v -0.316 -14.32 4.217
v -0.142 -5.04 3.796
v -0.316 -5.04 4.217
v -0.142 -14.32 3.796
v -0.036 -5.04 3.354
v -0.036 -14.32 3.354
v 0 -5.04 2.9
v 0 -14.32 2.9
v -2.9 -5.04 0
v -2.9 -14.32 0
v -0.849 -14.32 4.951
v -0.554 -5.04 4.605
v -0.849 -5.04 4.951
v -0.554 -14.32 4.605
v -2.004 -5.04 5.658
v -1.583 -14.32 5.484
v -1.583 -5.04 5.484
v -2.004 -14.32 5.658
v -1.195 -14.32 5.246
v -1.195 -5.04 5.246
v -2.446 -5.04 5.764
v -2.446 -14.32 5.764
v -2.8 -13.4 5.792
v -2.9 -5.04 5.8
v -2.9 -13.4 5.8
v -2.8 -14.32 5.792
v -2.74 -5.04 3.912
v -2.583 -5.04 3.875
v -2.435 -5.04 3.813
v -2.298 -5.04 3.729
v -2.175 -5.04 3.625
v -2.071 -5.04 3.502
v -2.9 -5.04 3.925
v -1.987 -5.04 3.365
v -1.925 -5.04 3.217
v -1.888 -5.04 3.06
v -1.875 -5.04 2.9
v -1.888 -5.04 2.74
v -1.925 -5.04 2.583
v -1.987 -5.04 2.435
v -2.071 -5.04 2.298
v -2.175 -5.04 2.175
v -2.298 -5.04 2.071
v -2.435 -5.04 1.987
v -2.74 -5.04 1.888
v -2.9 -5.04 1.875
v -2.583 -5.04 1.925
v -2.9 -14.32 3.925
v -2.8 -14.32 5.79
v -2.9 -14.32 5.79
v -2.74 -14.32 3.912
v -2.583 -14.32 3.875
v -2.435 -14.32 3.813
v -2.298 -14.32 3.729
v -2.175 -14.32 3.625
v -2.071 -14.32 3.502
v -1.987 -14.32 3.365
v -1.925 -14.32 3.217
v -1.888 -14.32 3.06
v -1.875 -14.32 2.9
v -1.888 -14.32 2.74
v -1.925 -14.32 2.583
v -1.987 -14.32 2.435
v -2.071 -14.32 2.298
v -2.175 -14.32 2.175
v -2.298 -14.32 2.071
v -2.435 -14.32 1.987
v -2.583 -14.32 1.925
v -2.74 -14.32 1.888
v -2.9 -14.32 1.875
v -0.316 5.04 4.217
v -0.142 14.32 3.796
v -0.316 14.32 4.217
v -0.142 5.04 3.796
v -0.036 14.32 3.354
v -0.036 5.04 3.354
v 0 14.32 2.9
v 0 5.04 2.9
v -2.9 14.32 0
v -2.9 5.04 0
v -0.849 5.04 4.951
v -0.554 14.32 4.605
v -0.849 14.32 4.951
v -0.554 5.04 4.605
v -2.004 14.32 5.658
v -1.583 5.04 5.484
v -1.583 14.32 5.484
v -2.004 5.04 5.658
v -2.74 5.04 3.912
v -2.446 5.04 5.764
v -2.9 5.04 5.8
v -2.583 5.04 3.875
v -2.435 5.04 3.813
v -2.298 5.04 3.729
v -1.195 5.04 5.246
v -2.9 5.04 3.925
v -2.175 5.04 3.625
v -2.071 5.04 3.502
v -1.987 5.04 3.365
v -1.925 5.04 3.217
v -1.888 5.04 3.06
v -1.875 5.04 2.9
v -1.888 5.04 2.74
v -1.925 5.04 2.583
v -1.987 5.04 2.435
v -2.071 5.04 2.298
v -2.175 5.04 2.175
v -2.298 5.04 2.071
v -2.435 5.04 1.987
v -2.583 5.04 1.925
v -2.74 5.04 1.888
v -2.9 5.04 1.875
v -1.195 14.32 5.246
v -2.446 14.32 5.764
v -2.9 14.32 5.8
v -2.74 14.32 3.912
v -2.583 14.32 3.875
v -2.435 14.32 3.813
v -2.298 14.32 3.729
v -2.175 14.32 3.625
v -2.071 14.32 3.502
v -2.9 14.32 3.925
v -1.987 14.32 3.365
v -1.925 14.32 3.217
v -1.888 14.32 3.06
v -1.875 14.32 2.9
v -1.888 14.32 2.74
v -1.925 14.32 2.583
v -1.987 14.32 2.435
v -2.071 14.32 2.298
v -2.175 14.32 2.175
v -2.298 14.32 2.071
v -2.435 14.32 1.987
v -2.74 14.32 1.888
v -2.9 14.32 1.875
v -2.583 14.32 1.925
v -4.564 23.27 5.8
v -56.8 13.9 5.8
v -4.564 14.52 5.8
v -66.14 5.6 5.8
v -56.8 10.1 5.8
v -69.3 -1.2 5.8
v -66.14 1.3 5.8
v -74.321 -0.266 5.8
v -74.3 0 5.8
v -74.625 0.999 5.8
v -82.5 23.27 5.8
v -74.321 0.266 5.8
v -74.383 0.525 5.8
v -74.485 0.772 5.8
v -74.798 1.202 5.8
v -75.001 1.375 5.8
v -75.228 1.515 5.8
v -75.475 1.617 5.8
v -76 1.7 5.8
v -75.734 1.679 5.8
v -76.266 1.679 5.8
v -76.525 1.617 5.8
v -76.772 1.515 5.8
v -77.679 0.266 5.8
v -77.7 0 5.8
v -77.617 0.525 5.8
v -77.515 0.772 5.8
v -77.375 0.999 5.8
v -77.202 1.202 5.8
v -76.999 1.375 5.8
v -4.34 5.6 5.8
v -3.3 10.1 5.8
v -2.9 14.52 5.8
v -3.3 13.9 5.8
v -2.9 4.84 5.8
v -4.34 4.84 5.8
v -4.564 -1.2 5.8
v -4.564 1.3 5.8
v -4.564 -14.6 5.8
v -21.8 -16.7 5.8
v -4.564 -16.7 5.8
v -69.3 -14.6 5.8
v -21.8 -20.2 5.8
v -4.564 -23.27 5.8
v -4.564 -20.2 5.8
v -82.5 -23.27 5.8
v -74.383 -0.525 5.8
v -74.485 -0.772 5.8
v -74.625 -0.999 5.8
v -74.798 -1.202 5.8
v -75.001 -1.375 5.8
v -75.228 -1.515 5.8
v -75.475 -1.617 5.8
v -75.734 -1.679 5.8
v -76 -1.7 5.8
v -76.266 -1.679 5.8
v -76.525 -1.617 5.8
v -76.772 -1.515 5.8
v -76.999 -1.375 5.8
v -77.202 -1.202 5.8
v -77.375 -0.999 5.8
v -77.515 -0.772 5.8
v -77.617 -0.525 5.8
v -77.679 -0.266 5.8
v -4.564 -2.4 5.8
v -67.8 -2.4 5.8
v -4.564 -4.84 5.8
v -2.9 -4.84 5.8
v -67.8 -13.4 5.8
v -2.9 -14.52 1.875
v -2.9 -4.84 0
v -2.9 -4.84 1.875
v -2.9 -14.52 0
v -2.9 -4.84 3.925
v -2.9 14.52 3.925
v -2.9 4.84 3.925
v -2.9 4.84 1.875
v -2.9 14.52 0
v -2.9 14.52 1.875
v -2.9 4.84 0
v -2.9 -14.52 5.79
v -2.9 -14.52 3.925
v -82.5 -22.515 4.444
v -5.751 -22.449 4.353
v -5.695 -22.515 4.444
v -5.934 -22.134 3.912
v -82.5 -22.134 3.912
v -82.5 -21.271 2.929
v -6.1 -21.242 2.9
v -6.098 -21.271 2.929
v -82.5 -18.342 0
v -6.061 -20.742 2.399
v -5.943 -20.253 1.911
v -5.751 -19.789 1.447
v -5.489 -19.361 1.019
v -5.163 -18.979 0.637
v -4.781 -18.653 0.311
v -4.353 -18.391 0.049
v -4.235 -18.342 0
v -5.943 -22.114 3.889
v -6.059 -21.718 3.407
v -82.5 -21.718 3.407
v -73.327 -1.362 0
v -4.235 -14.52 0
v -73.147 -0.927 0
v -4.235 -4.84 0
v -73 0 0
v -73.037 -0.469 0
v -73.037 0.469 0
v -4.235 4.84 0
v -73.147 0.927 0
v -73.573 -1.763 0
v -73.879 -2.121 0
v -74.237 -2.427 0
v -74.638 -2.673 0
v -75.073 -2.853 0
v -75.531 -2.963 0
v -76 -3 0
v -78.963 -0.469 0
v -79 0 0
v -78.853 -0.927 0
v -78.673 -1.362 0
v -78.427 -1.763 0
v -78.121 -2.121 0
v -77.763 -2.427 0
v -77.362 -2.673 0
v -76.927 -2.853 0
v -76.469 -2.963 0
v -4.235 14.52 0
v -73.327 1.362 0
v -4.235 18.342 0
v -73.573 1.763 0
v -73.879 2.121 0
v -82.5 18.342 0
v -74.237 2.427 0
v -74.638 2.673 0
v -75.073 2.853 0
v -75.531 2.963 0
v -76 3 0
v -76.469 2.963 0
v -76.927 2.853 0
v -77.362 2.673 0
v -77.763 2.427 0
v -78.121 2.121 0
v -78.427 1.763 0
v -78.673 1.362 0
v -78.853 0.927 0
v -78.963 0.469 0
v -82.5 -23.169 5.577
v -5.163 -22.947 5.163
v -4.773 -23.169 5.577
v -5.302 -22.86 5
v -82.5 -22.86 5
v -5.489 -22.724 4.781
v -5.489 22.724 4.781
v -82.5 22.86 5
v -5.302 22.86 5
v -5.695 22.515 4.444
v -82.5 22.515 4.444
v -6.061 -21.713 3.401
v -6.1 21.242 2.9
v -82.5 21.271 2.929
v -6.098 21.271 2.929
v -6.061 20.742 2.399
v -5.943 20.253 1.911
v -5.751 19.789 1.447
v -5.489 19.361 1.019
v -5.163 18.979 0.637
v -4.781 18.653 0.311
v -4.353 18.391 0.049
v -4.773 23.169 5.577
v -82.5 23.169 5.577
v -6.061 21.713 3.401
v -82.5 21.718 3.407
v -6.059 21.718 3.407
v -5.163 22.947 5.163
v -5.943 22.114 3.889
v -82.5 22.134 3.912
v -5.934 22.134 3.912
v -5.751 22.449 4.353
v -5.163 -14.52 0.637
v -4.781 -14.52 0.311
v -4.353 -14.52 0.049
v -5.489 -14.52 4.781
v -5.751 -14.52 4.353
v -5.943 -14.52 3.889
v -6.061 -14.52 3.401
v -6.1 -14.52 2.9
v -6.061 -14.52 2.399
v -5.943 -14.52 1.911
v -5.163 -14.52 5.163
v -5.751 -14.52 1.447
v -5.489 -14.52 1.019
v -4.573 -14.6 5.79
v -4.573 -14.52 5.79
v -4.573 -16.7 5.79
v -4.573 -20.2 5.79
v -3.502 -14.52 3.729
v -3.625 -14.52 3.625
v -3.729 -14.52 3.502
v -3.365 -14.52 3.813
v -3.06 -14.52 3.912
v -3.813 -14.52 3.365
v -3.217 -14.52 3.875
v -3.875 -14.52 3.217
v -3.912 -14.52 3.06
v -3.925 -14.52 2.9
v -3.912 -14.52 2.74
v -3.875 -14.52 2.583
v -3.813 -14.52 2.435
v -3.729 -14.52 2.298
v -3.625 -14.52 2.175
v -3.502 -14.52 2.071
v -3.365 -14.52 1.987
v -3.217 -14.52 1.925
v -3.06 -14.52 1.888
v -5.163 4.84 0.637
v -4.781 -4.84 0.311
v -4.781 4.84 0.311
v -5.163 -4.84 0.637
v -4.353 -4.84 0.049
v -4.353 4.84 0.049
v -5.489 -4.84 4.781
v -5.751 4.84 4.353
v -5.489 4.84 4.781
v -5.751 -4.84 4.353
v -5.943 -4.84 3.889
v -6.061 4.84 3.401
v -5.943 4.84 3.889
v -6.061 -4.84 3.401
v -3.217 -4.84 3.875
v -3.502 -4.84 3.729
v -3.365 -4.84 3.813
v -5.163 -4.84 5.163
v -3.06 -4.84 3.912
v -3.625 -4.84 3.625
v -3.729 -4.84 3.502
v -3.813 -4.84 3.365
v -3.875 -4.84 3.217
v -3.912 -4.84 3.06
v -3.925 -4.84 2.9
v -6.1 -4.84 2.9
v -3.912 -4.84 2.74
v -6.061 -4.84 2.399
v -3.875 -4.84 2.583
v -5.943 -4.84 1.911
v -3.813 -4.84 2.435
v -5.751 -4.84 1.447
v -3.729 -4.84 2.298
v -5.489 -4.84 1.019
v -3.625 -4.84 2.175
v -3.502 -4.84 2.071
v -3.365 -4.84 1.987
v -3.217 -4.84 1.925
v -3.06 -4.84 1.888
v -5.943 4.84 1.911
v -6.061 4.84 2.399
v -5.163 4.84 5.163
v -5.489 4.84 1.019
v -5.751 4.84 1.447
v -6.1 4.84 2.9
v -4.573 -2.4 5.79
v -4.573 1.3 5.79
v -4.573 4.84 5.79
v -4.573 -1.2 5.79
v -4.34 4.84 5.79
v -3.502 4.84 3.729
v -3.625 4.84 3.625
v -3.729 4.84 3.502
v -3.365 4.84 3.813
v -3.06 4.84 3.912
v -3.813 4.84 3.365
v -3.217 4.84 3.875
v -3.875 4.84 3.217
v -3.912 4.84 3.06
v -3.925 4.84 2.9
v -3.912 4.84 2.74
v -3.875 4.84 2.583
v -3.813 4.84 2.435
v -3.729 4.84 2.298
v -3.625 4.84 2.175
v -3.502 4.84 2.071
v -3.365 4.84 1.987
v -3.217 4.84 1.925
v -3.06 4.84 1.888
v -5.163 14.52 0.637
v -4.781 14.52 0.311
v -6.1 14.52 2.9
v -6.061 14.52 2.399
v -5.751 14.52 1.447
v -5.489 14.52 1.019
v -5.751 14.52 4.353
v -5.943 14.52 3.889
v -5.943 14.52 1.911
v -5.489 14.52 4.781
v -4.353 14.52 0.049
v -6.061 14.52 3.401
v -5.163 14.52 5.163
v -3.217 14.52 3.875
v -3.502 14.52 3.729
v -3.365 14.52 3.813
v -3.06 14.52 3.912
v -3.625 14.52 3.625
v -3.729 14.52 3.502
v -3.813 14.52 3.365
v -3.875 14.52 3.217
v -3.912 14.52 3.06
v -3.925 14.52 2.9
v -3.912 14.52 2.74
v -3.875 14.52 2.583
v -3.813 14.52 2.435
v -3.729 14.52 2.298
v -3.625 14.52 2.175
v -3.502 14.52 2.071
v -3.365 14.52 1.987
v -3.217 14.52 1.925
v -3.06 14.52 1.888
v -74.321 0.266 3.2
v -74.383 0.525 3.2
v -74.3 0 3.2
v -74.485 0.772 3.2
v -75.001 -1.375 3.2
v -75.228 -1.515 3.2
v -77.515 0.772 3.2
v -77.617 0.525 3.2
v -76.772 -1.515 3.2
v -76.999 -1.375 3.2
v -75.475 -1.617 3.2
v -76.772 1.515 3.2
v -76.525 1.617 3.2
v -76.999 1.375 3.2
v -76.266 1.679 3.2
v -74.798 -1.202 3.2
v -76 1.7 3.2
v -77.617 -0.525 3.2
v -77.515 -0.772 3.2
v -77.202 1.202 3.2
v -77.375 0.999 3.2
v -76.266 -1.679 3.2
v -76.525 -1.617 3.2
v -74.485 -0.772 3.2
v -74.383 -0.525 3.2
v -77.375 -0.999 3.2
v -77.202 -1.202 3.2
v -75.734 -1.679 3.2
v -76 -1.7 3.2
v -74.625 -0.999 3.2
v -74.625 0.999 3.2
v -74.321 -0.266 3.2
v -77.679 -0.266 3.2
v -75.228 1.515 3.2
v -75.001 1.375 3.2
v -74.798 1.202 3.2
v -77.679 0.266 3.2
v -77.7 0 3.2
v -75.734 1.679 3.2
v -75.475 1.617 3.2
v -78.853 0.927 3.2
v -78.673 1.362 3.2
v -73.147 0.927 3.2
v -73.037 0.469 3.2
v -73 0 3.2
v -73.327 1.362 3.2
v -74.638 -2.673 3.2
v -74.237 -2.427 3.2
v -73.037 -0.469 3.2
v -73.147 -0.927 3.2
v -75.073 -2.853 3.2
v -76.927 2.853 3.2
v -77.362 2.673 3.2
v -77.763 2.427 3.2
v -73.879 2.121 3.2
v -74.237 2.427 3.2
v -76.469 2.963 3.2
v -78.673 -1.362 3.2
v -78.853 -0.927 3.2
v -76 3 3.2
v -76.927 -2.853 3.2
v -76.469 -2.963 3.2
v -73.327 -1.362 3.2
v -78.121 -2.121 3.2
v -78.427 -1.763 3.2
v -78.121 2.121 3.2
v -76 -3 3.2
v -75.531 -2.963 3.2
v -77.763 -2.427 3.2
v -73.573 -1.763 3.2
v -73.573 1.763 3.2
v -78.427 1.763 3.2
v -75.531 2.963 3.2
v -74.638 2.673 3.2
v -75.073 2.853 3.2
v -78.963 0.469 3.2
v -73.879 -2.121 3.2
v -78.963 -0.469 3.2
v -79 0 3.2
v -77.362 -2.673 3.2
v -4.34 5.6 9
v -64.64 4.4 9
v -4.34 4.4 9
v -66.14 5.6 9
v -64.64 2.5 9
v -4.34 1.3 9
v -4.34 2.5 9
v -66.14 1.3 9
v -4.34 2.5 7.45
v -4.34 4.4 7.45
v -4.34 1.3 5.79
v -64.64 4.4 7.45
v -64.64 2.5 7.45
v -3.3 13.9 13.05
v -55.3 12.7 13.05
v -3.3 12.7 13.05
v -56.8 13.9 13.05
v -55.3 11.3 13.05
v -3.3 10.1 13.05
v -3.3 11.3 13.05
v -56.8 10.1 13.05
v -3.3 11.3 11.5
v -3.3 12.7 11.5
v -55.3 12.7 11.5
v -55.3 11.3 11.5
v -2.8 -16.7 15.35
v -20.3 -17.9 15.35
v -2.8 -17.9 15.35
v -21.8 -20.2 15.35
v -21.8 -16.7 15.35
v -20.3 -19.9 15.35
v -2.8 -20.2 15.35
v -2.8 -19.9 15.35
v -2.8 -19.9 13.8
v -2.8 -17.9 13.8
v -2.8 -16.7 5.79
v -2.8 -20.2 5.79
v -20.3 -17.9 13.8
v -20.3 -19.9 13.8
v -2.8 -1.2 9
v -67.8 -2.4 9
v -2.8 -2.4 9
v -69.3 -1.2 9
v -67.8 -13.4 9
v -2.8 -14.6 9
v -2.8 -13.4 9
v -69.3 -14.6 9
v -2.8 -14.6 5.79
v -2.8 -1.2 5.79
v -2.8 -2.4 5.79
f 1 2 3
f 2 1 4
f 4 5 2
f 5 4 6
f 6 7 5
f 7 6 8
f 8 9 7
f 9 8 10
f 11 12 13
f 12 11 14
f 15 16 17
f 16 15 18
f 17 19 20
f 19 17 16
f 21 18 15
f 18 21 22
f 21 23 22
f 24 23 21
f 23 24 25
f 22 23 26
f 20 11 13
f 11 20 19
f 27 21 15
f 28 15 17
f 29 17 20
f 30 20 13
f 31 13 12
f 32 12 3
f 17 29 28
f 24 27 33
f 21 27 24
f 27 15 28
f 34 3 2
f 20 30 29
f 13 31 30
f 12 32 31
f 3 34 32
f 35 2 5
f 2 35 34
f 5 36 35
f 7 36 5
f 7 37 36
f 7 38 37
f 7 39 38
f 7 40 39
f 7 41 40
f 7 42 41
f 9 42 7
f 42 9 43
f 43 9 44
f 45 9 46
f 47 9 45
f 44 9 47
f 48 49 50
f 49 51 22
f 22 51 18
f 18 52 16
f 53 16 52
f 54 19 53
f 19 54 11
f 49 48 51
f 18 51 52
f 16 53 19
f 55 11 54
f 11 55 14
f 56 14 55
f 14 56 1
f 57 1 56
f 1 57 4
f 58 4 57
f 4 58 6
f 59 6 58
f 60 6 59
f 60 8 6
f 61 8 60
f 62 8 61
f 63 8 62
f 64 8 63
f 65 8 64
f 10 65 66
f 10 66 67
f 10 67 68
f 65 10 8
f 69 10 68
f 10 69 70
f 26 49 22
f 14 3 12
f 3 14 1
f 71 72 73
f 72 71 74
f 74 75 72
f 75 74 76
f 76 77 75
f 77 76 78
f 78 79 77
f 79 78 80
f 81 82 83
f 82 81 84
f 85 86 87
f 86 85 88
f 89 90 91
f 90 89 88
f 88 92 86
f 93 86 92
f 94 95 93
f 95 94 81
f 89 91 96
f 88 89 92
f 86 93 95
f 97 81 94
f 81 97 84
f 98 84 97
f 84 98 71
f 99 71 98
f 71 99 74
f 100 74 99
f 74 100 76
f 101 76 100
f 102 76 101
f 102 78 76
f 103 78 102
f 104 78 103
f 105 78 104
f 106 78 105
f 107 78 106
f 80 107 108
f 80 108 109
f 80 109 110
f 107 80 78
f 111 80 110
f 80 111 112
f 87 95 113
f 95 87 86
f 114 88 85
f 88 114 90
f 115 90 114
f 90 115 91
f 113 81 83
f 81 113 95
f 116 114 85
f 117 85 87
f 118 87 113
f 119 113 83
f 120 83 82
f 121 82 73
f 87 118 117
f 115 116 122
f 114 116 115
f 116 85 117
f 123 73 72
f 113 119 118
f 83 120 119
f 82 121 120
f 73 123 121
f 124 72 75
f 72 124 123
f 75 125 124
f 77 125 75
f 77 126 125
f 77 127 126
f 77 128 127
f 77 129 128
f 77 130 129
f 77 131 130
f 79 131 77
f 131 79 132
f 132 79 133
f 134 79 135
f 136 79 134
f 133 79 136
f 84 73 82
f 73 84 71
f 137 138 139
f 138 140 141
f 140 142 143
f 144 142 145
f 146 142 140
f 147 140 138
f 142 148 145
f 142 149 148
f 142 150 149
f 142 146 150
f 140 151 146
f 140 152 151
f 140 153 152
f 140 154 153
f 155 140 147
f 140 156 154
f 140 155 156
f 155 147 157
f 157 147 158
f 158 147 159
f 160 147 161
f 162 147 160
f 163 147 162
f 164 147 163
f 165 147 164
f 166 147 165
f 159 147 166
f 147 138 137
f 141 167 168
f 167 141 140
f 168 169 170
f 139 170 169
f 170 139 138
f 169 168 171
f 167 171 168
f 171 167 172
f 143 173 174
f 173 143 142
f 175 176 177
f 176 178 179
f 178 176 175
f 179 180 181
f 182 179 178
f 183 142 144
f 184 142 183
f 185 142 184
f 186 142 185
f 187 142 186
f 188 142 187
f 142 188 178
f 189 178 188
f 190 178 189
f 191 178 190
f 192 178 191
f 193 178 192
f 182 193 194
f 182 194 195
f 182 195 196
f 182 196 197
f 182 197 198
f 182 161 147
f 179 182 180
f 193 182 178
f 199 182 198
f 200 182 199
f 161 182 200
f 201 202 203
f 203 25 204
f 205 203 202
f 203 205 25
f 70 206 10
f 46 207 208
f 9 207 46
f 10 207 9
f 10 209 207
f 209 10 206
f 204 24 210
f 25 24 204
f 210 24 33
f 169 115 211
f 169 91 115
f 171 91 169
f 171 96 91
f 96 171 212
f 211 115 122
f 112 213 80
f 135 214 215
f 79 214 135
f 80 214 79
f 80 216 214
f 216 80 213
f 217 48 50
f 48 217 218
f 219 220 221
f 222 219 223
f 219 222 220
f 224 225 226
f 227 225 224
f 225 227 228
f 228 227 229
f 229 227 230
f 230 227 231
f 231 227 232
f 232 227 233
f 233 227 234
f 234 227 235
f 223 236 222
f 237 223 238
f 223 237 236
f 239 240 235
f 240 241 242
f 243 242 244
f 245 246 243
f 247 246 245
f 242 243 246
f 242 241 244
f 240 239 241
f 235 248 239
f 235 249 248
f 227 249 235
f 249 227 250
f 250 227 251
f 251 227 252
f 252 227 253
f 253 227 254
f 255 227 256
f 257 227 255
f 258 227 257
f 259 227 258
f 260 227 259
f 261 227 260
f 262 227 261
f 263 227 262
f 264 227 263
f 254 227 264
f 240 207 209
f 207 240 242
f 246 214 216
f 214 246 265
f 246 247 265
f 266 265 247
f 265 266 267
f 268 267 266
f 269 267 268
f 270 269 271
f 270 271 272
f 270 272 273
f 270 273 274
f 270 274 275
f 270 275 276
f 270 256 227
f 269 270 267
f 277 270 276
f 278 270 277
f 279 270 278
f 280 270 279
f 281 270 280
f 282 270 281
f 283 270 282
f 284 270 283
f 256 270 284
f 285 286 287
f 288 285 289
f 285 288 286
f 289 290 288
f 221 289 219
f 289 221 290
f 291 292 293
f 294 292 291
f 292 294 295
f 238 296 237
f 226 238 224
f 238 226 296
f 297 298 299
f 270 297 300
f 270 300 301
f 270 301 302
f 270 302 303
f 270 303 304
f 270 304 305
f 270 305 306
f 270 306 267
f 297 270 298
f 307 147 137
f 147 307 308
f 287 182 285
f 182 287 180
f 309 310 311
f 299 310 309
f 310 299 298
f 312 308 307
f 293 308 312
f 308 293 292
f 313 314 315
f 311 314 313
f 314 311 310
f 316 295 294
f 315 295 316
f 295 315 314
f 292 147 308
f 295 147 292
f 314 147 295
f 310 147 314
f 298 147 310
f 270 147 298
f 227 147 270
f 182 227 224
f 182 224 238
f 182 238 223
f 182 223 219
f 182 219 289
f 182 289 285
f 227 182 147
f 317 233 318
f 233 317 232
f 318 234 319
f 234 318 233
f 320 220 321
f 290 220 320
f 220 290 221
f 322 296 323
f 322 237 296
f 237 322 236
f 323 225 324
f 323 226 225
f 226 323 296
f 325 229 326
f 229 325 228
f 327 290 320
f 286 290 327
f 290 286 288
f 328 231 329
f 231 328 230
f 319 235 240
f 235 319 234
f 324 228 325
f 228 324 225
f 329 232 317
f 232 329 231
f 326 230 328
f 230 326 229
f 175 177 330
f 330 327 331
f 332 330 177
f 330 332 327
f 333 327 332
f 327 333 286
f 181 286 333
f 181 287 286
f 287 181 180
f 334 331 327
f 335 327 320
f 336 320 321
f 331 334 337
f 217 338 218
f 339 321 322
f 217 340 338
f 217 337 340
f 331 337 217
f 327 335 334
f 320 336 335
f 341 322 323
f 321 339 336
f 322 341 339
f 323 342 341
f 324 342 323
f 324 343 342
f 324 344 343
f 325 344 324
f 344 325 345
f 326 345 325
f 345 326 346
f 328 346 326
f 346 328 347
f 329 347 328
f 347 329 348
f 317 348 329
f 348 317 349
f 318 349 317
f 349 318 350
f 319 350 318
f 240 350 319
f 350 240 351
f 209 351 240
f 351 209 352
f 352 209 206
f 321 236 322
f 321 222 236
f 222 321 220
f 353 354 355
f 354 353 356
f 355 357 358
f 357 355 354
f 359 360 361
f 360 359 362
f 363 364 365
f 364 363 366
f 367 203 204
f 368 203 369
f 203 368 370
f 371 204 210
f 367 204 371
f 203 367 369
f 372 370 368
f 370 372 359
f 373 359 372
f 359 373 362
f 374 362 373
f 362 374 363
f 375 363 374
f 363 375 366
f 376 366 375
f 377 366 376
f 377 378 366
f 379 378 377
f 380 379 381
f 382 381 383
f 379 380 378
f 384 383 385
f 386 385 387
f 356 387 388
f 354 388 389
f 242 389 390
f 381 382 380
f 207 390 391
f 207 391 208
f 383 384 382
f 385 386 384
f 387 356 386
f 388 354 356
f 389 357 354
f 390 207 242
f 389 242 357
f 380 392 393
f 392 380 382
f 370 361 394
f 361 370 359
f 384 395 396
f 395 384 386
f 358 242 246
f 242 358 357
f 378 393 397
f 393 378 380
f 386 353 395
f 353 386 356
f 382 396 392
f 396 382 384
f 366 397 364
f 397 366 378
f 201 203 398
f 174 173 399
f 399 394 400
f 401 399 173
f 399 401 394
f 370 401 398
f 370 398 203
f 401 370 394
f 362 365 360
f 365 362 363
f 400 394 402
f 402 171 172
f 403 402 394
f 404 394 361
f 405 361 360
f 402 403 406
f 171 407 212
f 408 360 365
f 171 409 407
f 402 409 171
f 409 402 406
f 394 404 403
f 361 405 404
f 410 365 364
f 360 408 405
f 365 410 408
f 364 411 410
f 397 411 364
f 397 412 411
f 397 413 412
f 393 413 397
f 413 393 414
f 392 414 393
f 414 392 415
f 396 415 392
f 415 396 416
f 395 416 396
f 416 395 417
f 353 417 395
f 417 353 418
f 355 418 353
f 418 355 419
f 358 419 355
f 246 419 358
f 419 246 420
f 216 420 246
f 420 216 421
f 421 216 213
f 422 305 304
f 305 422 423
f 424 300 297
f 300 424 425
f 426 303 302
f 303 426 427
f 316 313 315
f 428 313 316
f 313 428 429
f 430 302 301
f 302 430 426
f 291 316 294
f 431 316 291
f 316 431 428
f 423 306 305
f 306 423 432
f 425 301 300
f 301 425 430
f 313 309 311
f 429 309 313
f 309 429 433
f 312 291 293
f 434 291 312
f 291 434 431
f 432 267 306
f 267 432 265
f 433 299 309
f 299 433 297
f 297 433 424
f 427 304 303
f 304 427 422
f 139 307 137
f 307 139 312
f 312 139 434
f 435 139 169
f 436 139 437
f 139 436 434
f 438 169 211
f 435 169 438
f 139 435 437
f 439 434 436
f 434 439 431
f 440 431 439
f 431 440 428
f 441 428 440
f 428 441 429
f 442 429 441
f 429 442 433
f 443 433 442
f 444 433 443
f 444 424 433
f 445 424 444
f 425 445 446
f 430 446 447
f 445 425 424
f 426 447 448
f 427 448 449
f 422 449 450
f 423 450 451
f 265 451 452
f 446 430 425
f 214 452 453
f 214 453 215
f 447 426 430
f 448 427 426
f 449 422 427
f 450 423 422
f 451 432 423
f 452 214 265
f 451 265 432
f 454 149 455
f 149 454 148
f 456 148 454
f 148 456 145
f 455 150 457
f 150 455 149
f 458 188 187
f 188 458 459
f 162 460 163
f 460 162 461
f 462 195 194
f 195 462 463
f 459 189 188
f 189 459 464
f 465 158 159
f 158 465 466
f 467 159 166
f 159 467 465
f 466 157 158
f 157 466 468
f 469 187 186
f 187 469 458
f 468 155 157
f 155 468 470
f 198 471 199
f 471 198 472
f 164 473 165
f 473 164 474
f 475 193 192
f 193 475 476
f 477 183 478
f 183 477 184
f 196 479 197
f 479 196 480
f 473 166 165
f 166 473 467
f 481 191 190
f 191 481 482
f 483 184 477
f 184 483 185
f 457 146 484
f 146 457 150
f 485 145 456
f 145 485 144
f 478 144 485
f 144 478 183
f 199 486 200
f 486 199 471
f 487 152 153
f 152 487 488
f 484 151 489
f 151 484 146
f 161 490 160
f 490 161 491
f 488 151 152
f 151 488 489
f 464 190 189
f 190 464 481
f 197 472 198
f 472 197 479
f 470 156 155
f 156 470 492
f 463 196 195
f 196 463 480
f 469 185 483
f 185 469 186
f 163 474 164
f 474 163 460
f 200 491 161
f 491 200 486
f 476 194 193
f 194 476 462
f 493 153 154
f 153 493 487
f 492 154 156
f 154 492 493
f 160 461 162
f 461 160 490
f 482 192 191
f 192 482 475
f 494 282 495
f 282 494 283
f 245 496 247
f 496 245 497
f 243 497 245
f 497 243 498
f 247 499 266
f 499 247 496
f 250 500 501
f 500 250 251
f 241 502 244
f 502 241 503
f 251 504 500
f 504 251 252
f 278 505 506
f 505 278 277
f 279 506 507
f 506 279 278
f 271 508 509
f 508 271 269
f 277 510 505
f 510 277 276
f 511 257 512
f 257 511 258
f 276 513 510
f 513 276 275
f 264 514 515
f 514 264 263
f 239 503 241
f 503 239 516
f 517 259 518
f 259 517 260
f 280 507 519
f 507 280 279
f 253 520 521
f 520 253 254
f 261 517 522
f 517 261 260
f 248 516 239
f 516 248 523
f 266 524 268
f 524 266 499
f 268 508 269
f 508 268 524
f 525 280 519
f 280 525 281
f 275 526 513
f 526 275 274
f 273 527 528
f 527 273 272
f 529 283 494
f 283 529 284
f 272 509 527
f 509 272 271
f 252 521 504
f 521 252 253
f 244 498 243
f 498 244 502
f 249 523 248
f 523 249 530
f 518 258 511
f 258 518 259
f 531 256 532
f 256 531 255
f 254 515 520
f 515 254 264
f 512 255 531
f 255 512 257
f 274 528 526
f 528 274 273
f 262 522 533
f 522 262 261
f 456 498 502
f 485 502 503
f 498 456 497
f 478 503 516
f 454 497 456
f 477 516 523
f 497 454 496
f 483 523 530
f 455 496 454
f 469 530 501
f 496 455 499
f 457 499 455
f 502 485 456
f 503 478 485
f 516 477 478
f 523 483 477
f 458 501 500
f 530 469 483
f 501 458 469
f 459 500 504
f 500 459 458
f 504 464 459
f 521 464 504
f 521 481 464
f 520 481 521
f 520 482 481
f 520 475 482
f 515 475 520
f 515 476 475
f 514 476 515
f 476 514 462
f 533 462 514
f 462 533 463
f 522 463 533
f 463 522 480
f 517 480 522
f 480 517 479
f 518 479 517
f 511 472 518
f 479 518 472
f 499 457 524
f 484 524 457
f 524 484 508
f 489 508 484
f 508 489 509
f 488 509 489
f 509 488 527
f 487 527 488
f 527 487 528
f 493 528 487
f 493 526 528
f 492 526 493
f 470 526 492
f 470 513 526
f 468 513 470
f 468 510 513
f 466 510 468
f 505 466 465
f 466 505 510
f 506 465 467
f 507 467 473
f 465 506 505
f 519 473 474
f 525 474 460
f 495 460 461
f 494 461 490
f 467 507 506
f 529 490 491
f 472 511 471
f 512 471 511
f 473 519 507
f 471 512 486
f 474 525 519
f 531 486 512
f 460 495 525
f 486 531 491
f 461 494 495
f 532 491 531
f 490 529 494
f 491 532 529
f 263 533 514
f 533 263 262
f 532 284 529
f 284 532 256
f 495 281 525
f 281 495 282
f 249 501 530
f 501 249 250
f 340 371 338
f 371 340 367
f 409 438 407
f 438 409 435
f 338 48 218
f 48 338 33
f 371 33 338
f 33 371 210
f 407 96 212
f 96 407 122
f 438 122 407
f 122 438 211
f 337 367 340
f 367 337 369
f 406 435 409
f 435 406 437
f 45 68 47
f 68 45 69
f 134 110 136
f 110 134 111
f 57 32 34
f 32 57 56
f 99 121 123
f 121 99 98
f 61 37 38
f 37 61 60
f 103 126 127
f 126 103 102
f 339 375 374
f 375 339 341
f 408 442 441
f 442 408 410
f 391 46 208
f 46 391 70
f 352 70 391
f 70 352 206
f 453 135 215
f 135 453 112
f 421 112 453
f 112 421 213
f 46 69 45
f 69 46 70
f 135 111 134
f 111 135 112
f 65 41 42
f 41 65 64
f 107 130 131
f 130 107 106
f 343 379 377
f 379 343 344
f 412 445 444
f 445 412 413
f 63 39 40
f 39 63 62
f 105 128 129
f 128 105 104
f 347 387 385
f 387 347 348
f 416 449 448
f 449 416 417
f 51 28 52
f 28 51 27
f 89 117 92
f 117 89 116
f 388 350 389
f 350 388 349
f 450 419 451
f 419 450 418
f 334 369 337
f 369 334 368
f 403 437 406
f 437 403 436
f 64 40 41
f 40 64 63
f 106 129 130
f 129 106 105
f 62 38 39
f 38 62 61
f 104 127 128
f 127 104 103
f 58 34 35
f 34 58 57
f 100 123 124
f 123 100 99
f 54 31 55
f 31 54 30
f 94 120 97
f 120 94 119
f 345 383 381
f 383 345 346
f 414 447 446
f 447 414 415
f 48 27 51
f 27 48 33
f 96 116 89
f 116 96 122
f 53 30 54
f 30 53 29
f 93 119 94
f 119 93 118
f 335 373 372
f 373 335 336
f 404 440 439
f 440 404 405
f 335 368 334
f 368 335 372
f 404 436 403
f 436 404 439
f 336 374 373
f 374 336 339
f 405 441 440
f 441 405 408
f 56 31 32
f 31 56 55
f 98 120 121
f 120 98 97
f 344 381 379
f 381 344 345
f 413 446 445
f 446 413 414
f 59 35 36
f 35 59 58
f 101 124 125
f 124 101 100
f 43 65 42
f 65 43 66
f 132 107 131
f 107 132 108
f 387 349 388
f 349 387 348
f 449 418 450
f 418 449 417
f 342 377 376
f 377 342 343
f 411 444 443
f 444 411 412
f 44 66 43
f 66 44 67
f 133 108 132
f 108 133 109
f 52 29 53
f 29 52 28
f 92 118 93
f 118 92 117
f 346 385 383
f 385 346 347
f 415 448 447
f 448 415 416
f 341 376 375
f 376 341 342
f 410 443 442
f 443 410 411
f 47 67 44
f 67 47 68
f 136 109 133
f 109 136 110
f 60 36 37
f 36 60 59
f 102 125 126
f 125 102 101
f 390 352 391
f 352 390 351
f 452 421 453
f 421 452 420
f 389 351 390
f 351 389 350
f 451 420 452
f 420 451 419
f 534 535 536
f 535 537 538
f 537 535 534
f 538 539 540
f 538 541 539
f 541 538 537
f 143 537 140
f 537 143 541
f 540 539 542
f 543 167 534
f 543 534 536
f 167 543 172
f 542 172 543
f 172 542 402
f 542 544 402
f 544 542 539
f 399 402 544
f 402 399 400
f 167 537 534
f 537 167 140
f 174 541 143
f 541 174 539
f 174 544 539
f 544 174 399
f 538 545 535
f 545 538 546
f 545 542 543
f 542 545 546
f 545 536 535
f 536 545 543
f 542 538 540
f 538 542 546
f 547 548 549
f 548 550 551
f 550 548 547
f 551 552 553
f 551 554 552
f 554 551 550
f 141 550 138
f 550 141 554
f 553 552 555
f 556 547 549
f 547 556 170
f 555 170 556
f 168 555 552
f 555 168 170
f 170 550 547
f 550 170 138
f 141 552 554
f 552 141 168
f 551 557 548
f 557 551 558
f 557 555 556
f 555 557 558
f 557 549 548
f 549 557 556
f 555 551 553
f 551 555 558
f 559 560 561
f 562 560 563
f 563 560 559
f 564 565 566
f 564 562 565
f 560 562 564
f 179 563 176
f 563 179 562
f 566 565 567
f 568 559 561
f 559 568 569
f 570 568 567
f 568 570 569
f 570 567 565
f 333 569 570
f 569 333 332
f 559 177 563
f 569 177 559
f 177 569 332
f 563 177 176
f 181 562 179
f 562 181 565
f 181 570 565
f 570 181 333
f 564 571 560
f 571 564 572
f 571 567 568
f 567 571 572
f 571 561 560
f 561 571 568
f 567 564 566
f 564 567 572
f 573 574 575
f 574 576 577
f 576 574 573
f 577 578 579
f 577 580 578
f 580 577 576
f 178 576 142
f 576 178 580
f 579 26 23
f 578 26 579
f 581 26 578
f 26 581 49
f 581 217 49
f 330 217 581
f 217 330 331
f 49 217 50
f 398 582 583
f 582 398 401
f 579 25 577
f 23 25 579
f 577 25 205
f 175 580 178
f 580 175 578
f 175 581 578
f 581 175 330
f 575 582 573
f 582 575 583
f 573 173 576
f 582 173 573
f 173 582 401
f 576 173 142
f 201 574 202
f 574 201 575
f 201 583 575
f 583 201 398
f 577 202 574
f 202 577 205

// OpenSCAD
include <../lib/hc33-lipo-case-lib.scad>;
$fn = 40;
door_print();
